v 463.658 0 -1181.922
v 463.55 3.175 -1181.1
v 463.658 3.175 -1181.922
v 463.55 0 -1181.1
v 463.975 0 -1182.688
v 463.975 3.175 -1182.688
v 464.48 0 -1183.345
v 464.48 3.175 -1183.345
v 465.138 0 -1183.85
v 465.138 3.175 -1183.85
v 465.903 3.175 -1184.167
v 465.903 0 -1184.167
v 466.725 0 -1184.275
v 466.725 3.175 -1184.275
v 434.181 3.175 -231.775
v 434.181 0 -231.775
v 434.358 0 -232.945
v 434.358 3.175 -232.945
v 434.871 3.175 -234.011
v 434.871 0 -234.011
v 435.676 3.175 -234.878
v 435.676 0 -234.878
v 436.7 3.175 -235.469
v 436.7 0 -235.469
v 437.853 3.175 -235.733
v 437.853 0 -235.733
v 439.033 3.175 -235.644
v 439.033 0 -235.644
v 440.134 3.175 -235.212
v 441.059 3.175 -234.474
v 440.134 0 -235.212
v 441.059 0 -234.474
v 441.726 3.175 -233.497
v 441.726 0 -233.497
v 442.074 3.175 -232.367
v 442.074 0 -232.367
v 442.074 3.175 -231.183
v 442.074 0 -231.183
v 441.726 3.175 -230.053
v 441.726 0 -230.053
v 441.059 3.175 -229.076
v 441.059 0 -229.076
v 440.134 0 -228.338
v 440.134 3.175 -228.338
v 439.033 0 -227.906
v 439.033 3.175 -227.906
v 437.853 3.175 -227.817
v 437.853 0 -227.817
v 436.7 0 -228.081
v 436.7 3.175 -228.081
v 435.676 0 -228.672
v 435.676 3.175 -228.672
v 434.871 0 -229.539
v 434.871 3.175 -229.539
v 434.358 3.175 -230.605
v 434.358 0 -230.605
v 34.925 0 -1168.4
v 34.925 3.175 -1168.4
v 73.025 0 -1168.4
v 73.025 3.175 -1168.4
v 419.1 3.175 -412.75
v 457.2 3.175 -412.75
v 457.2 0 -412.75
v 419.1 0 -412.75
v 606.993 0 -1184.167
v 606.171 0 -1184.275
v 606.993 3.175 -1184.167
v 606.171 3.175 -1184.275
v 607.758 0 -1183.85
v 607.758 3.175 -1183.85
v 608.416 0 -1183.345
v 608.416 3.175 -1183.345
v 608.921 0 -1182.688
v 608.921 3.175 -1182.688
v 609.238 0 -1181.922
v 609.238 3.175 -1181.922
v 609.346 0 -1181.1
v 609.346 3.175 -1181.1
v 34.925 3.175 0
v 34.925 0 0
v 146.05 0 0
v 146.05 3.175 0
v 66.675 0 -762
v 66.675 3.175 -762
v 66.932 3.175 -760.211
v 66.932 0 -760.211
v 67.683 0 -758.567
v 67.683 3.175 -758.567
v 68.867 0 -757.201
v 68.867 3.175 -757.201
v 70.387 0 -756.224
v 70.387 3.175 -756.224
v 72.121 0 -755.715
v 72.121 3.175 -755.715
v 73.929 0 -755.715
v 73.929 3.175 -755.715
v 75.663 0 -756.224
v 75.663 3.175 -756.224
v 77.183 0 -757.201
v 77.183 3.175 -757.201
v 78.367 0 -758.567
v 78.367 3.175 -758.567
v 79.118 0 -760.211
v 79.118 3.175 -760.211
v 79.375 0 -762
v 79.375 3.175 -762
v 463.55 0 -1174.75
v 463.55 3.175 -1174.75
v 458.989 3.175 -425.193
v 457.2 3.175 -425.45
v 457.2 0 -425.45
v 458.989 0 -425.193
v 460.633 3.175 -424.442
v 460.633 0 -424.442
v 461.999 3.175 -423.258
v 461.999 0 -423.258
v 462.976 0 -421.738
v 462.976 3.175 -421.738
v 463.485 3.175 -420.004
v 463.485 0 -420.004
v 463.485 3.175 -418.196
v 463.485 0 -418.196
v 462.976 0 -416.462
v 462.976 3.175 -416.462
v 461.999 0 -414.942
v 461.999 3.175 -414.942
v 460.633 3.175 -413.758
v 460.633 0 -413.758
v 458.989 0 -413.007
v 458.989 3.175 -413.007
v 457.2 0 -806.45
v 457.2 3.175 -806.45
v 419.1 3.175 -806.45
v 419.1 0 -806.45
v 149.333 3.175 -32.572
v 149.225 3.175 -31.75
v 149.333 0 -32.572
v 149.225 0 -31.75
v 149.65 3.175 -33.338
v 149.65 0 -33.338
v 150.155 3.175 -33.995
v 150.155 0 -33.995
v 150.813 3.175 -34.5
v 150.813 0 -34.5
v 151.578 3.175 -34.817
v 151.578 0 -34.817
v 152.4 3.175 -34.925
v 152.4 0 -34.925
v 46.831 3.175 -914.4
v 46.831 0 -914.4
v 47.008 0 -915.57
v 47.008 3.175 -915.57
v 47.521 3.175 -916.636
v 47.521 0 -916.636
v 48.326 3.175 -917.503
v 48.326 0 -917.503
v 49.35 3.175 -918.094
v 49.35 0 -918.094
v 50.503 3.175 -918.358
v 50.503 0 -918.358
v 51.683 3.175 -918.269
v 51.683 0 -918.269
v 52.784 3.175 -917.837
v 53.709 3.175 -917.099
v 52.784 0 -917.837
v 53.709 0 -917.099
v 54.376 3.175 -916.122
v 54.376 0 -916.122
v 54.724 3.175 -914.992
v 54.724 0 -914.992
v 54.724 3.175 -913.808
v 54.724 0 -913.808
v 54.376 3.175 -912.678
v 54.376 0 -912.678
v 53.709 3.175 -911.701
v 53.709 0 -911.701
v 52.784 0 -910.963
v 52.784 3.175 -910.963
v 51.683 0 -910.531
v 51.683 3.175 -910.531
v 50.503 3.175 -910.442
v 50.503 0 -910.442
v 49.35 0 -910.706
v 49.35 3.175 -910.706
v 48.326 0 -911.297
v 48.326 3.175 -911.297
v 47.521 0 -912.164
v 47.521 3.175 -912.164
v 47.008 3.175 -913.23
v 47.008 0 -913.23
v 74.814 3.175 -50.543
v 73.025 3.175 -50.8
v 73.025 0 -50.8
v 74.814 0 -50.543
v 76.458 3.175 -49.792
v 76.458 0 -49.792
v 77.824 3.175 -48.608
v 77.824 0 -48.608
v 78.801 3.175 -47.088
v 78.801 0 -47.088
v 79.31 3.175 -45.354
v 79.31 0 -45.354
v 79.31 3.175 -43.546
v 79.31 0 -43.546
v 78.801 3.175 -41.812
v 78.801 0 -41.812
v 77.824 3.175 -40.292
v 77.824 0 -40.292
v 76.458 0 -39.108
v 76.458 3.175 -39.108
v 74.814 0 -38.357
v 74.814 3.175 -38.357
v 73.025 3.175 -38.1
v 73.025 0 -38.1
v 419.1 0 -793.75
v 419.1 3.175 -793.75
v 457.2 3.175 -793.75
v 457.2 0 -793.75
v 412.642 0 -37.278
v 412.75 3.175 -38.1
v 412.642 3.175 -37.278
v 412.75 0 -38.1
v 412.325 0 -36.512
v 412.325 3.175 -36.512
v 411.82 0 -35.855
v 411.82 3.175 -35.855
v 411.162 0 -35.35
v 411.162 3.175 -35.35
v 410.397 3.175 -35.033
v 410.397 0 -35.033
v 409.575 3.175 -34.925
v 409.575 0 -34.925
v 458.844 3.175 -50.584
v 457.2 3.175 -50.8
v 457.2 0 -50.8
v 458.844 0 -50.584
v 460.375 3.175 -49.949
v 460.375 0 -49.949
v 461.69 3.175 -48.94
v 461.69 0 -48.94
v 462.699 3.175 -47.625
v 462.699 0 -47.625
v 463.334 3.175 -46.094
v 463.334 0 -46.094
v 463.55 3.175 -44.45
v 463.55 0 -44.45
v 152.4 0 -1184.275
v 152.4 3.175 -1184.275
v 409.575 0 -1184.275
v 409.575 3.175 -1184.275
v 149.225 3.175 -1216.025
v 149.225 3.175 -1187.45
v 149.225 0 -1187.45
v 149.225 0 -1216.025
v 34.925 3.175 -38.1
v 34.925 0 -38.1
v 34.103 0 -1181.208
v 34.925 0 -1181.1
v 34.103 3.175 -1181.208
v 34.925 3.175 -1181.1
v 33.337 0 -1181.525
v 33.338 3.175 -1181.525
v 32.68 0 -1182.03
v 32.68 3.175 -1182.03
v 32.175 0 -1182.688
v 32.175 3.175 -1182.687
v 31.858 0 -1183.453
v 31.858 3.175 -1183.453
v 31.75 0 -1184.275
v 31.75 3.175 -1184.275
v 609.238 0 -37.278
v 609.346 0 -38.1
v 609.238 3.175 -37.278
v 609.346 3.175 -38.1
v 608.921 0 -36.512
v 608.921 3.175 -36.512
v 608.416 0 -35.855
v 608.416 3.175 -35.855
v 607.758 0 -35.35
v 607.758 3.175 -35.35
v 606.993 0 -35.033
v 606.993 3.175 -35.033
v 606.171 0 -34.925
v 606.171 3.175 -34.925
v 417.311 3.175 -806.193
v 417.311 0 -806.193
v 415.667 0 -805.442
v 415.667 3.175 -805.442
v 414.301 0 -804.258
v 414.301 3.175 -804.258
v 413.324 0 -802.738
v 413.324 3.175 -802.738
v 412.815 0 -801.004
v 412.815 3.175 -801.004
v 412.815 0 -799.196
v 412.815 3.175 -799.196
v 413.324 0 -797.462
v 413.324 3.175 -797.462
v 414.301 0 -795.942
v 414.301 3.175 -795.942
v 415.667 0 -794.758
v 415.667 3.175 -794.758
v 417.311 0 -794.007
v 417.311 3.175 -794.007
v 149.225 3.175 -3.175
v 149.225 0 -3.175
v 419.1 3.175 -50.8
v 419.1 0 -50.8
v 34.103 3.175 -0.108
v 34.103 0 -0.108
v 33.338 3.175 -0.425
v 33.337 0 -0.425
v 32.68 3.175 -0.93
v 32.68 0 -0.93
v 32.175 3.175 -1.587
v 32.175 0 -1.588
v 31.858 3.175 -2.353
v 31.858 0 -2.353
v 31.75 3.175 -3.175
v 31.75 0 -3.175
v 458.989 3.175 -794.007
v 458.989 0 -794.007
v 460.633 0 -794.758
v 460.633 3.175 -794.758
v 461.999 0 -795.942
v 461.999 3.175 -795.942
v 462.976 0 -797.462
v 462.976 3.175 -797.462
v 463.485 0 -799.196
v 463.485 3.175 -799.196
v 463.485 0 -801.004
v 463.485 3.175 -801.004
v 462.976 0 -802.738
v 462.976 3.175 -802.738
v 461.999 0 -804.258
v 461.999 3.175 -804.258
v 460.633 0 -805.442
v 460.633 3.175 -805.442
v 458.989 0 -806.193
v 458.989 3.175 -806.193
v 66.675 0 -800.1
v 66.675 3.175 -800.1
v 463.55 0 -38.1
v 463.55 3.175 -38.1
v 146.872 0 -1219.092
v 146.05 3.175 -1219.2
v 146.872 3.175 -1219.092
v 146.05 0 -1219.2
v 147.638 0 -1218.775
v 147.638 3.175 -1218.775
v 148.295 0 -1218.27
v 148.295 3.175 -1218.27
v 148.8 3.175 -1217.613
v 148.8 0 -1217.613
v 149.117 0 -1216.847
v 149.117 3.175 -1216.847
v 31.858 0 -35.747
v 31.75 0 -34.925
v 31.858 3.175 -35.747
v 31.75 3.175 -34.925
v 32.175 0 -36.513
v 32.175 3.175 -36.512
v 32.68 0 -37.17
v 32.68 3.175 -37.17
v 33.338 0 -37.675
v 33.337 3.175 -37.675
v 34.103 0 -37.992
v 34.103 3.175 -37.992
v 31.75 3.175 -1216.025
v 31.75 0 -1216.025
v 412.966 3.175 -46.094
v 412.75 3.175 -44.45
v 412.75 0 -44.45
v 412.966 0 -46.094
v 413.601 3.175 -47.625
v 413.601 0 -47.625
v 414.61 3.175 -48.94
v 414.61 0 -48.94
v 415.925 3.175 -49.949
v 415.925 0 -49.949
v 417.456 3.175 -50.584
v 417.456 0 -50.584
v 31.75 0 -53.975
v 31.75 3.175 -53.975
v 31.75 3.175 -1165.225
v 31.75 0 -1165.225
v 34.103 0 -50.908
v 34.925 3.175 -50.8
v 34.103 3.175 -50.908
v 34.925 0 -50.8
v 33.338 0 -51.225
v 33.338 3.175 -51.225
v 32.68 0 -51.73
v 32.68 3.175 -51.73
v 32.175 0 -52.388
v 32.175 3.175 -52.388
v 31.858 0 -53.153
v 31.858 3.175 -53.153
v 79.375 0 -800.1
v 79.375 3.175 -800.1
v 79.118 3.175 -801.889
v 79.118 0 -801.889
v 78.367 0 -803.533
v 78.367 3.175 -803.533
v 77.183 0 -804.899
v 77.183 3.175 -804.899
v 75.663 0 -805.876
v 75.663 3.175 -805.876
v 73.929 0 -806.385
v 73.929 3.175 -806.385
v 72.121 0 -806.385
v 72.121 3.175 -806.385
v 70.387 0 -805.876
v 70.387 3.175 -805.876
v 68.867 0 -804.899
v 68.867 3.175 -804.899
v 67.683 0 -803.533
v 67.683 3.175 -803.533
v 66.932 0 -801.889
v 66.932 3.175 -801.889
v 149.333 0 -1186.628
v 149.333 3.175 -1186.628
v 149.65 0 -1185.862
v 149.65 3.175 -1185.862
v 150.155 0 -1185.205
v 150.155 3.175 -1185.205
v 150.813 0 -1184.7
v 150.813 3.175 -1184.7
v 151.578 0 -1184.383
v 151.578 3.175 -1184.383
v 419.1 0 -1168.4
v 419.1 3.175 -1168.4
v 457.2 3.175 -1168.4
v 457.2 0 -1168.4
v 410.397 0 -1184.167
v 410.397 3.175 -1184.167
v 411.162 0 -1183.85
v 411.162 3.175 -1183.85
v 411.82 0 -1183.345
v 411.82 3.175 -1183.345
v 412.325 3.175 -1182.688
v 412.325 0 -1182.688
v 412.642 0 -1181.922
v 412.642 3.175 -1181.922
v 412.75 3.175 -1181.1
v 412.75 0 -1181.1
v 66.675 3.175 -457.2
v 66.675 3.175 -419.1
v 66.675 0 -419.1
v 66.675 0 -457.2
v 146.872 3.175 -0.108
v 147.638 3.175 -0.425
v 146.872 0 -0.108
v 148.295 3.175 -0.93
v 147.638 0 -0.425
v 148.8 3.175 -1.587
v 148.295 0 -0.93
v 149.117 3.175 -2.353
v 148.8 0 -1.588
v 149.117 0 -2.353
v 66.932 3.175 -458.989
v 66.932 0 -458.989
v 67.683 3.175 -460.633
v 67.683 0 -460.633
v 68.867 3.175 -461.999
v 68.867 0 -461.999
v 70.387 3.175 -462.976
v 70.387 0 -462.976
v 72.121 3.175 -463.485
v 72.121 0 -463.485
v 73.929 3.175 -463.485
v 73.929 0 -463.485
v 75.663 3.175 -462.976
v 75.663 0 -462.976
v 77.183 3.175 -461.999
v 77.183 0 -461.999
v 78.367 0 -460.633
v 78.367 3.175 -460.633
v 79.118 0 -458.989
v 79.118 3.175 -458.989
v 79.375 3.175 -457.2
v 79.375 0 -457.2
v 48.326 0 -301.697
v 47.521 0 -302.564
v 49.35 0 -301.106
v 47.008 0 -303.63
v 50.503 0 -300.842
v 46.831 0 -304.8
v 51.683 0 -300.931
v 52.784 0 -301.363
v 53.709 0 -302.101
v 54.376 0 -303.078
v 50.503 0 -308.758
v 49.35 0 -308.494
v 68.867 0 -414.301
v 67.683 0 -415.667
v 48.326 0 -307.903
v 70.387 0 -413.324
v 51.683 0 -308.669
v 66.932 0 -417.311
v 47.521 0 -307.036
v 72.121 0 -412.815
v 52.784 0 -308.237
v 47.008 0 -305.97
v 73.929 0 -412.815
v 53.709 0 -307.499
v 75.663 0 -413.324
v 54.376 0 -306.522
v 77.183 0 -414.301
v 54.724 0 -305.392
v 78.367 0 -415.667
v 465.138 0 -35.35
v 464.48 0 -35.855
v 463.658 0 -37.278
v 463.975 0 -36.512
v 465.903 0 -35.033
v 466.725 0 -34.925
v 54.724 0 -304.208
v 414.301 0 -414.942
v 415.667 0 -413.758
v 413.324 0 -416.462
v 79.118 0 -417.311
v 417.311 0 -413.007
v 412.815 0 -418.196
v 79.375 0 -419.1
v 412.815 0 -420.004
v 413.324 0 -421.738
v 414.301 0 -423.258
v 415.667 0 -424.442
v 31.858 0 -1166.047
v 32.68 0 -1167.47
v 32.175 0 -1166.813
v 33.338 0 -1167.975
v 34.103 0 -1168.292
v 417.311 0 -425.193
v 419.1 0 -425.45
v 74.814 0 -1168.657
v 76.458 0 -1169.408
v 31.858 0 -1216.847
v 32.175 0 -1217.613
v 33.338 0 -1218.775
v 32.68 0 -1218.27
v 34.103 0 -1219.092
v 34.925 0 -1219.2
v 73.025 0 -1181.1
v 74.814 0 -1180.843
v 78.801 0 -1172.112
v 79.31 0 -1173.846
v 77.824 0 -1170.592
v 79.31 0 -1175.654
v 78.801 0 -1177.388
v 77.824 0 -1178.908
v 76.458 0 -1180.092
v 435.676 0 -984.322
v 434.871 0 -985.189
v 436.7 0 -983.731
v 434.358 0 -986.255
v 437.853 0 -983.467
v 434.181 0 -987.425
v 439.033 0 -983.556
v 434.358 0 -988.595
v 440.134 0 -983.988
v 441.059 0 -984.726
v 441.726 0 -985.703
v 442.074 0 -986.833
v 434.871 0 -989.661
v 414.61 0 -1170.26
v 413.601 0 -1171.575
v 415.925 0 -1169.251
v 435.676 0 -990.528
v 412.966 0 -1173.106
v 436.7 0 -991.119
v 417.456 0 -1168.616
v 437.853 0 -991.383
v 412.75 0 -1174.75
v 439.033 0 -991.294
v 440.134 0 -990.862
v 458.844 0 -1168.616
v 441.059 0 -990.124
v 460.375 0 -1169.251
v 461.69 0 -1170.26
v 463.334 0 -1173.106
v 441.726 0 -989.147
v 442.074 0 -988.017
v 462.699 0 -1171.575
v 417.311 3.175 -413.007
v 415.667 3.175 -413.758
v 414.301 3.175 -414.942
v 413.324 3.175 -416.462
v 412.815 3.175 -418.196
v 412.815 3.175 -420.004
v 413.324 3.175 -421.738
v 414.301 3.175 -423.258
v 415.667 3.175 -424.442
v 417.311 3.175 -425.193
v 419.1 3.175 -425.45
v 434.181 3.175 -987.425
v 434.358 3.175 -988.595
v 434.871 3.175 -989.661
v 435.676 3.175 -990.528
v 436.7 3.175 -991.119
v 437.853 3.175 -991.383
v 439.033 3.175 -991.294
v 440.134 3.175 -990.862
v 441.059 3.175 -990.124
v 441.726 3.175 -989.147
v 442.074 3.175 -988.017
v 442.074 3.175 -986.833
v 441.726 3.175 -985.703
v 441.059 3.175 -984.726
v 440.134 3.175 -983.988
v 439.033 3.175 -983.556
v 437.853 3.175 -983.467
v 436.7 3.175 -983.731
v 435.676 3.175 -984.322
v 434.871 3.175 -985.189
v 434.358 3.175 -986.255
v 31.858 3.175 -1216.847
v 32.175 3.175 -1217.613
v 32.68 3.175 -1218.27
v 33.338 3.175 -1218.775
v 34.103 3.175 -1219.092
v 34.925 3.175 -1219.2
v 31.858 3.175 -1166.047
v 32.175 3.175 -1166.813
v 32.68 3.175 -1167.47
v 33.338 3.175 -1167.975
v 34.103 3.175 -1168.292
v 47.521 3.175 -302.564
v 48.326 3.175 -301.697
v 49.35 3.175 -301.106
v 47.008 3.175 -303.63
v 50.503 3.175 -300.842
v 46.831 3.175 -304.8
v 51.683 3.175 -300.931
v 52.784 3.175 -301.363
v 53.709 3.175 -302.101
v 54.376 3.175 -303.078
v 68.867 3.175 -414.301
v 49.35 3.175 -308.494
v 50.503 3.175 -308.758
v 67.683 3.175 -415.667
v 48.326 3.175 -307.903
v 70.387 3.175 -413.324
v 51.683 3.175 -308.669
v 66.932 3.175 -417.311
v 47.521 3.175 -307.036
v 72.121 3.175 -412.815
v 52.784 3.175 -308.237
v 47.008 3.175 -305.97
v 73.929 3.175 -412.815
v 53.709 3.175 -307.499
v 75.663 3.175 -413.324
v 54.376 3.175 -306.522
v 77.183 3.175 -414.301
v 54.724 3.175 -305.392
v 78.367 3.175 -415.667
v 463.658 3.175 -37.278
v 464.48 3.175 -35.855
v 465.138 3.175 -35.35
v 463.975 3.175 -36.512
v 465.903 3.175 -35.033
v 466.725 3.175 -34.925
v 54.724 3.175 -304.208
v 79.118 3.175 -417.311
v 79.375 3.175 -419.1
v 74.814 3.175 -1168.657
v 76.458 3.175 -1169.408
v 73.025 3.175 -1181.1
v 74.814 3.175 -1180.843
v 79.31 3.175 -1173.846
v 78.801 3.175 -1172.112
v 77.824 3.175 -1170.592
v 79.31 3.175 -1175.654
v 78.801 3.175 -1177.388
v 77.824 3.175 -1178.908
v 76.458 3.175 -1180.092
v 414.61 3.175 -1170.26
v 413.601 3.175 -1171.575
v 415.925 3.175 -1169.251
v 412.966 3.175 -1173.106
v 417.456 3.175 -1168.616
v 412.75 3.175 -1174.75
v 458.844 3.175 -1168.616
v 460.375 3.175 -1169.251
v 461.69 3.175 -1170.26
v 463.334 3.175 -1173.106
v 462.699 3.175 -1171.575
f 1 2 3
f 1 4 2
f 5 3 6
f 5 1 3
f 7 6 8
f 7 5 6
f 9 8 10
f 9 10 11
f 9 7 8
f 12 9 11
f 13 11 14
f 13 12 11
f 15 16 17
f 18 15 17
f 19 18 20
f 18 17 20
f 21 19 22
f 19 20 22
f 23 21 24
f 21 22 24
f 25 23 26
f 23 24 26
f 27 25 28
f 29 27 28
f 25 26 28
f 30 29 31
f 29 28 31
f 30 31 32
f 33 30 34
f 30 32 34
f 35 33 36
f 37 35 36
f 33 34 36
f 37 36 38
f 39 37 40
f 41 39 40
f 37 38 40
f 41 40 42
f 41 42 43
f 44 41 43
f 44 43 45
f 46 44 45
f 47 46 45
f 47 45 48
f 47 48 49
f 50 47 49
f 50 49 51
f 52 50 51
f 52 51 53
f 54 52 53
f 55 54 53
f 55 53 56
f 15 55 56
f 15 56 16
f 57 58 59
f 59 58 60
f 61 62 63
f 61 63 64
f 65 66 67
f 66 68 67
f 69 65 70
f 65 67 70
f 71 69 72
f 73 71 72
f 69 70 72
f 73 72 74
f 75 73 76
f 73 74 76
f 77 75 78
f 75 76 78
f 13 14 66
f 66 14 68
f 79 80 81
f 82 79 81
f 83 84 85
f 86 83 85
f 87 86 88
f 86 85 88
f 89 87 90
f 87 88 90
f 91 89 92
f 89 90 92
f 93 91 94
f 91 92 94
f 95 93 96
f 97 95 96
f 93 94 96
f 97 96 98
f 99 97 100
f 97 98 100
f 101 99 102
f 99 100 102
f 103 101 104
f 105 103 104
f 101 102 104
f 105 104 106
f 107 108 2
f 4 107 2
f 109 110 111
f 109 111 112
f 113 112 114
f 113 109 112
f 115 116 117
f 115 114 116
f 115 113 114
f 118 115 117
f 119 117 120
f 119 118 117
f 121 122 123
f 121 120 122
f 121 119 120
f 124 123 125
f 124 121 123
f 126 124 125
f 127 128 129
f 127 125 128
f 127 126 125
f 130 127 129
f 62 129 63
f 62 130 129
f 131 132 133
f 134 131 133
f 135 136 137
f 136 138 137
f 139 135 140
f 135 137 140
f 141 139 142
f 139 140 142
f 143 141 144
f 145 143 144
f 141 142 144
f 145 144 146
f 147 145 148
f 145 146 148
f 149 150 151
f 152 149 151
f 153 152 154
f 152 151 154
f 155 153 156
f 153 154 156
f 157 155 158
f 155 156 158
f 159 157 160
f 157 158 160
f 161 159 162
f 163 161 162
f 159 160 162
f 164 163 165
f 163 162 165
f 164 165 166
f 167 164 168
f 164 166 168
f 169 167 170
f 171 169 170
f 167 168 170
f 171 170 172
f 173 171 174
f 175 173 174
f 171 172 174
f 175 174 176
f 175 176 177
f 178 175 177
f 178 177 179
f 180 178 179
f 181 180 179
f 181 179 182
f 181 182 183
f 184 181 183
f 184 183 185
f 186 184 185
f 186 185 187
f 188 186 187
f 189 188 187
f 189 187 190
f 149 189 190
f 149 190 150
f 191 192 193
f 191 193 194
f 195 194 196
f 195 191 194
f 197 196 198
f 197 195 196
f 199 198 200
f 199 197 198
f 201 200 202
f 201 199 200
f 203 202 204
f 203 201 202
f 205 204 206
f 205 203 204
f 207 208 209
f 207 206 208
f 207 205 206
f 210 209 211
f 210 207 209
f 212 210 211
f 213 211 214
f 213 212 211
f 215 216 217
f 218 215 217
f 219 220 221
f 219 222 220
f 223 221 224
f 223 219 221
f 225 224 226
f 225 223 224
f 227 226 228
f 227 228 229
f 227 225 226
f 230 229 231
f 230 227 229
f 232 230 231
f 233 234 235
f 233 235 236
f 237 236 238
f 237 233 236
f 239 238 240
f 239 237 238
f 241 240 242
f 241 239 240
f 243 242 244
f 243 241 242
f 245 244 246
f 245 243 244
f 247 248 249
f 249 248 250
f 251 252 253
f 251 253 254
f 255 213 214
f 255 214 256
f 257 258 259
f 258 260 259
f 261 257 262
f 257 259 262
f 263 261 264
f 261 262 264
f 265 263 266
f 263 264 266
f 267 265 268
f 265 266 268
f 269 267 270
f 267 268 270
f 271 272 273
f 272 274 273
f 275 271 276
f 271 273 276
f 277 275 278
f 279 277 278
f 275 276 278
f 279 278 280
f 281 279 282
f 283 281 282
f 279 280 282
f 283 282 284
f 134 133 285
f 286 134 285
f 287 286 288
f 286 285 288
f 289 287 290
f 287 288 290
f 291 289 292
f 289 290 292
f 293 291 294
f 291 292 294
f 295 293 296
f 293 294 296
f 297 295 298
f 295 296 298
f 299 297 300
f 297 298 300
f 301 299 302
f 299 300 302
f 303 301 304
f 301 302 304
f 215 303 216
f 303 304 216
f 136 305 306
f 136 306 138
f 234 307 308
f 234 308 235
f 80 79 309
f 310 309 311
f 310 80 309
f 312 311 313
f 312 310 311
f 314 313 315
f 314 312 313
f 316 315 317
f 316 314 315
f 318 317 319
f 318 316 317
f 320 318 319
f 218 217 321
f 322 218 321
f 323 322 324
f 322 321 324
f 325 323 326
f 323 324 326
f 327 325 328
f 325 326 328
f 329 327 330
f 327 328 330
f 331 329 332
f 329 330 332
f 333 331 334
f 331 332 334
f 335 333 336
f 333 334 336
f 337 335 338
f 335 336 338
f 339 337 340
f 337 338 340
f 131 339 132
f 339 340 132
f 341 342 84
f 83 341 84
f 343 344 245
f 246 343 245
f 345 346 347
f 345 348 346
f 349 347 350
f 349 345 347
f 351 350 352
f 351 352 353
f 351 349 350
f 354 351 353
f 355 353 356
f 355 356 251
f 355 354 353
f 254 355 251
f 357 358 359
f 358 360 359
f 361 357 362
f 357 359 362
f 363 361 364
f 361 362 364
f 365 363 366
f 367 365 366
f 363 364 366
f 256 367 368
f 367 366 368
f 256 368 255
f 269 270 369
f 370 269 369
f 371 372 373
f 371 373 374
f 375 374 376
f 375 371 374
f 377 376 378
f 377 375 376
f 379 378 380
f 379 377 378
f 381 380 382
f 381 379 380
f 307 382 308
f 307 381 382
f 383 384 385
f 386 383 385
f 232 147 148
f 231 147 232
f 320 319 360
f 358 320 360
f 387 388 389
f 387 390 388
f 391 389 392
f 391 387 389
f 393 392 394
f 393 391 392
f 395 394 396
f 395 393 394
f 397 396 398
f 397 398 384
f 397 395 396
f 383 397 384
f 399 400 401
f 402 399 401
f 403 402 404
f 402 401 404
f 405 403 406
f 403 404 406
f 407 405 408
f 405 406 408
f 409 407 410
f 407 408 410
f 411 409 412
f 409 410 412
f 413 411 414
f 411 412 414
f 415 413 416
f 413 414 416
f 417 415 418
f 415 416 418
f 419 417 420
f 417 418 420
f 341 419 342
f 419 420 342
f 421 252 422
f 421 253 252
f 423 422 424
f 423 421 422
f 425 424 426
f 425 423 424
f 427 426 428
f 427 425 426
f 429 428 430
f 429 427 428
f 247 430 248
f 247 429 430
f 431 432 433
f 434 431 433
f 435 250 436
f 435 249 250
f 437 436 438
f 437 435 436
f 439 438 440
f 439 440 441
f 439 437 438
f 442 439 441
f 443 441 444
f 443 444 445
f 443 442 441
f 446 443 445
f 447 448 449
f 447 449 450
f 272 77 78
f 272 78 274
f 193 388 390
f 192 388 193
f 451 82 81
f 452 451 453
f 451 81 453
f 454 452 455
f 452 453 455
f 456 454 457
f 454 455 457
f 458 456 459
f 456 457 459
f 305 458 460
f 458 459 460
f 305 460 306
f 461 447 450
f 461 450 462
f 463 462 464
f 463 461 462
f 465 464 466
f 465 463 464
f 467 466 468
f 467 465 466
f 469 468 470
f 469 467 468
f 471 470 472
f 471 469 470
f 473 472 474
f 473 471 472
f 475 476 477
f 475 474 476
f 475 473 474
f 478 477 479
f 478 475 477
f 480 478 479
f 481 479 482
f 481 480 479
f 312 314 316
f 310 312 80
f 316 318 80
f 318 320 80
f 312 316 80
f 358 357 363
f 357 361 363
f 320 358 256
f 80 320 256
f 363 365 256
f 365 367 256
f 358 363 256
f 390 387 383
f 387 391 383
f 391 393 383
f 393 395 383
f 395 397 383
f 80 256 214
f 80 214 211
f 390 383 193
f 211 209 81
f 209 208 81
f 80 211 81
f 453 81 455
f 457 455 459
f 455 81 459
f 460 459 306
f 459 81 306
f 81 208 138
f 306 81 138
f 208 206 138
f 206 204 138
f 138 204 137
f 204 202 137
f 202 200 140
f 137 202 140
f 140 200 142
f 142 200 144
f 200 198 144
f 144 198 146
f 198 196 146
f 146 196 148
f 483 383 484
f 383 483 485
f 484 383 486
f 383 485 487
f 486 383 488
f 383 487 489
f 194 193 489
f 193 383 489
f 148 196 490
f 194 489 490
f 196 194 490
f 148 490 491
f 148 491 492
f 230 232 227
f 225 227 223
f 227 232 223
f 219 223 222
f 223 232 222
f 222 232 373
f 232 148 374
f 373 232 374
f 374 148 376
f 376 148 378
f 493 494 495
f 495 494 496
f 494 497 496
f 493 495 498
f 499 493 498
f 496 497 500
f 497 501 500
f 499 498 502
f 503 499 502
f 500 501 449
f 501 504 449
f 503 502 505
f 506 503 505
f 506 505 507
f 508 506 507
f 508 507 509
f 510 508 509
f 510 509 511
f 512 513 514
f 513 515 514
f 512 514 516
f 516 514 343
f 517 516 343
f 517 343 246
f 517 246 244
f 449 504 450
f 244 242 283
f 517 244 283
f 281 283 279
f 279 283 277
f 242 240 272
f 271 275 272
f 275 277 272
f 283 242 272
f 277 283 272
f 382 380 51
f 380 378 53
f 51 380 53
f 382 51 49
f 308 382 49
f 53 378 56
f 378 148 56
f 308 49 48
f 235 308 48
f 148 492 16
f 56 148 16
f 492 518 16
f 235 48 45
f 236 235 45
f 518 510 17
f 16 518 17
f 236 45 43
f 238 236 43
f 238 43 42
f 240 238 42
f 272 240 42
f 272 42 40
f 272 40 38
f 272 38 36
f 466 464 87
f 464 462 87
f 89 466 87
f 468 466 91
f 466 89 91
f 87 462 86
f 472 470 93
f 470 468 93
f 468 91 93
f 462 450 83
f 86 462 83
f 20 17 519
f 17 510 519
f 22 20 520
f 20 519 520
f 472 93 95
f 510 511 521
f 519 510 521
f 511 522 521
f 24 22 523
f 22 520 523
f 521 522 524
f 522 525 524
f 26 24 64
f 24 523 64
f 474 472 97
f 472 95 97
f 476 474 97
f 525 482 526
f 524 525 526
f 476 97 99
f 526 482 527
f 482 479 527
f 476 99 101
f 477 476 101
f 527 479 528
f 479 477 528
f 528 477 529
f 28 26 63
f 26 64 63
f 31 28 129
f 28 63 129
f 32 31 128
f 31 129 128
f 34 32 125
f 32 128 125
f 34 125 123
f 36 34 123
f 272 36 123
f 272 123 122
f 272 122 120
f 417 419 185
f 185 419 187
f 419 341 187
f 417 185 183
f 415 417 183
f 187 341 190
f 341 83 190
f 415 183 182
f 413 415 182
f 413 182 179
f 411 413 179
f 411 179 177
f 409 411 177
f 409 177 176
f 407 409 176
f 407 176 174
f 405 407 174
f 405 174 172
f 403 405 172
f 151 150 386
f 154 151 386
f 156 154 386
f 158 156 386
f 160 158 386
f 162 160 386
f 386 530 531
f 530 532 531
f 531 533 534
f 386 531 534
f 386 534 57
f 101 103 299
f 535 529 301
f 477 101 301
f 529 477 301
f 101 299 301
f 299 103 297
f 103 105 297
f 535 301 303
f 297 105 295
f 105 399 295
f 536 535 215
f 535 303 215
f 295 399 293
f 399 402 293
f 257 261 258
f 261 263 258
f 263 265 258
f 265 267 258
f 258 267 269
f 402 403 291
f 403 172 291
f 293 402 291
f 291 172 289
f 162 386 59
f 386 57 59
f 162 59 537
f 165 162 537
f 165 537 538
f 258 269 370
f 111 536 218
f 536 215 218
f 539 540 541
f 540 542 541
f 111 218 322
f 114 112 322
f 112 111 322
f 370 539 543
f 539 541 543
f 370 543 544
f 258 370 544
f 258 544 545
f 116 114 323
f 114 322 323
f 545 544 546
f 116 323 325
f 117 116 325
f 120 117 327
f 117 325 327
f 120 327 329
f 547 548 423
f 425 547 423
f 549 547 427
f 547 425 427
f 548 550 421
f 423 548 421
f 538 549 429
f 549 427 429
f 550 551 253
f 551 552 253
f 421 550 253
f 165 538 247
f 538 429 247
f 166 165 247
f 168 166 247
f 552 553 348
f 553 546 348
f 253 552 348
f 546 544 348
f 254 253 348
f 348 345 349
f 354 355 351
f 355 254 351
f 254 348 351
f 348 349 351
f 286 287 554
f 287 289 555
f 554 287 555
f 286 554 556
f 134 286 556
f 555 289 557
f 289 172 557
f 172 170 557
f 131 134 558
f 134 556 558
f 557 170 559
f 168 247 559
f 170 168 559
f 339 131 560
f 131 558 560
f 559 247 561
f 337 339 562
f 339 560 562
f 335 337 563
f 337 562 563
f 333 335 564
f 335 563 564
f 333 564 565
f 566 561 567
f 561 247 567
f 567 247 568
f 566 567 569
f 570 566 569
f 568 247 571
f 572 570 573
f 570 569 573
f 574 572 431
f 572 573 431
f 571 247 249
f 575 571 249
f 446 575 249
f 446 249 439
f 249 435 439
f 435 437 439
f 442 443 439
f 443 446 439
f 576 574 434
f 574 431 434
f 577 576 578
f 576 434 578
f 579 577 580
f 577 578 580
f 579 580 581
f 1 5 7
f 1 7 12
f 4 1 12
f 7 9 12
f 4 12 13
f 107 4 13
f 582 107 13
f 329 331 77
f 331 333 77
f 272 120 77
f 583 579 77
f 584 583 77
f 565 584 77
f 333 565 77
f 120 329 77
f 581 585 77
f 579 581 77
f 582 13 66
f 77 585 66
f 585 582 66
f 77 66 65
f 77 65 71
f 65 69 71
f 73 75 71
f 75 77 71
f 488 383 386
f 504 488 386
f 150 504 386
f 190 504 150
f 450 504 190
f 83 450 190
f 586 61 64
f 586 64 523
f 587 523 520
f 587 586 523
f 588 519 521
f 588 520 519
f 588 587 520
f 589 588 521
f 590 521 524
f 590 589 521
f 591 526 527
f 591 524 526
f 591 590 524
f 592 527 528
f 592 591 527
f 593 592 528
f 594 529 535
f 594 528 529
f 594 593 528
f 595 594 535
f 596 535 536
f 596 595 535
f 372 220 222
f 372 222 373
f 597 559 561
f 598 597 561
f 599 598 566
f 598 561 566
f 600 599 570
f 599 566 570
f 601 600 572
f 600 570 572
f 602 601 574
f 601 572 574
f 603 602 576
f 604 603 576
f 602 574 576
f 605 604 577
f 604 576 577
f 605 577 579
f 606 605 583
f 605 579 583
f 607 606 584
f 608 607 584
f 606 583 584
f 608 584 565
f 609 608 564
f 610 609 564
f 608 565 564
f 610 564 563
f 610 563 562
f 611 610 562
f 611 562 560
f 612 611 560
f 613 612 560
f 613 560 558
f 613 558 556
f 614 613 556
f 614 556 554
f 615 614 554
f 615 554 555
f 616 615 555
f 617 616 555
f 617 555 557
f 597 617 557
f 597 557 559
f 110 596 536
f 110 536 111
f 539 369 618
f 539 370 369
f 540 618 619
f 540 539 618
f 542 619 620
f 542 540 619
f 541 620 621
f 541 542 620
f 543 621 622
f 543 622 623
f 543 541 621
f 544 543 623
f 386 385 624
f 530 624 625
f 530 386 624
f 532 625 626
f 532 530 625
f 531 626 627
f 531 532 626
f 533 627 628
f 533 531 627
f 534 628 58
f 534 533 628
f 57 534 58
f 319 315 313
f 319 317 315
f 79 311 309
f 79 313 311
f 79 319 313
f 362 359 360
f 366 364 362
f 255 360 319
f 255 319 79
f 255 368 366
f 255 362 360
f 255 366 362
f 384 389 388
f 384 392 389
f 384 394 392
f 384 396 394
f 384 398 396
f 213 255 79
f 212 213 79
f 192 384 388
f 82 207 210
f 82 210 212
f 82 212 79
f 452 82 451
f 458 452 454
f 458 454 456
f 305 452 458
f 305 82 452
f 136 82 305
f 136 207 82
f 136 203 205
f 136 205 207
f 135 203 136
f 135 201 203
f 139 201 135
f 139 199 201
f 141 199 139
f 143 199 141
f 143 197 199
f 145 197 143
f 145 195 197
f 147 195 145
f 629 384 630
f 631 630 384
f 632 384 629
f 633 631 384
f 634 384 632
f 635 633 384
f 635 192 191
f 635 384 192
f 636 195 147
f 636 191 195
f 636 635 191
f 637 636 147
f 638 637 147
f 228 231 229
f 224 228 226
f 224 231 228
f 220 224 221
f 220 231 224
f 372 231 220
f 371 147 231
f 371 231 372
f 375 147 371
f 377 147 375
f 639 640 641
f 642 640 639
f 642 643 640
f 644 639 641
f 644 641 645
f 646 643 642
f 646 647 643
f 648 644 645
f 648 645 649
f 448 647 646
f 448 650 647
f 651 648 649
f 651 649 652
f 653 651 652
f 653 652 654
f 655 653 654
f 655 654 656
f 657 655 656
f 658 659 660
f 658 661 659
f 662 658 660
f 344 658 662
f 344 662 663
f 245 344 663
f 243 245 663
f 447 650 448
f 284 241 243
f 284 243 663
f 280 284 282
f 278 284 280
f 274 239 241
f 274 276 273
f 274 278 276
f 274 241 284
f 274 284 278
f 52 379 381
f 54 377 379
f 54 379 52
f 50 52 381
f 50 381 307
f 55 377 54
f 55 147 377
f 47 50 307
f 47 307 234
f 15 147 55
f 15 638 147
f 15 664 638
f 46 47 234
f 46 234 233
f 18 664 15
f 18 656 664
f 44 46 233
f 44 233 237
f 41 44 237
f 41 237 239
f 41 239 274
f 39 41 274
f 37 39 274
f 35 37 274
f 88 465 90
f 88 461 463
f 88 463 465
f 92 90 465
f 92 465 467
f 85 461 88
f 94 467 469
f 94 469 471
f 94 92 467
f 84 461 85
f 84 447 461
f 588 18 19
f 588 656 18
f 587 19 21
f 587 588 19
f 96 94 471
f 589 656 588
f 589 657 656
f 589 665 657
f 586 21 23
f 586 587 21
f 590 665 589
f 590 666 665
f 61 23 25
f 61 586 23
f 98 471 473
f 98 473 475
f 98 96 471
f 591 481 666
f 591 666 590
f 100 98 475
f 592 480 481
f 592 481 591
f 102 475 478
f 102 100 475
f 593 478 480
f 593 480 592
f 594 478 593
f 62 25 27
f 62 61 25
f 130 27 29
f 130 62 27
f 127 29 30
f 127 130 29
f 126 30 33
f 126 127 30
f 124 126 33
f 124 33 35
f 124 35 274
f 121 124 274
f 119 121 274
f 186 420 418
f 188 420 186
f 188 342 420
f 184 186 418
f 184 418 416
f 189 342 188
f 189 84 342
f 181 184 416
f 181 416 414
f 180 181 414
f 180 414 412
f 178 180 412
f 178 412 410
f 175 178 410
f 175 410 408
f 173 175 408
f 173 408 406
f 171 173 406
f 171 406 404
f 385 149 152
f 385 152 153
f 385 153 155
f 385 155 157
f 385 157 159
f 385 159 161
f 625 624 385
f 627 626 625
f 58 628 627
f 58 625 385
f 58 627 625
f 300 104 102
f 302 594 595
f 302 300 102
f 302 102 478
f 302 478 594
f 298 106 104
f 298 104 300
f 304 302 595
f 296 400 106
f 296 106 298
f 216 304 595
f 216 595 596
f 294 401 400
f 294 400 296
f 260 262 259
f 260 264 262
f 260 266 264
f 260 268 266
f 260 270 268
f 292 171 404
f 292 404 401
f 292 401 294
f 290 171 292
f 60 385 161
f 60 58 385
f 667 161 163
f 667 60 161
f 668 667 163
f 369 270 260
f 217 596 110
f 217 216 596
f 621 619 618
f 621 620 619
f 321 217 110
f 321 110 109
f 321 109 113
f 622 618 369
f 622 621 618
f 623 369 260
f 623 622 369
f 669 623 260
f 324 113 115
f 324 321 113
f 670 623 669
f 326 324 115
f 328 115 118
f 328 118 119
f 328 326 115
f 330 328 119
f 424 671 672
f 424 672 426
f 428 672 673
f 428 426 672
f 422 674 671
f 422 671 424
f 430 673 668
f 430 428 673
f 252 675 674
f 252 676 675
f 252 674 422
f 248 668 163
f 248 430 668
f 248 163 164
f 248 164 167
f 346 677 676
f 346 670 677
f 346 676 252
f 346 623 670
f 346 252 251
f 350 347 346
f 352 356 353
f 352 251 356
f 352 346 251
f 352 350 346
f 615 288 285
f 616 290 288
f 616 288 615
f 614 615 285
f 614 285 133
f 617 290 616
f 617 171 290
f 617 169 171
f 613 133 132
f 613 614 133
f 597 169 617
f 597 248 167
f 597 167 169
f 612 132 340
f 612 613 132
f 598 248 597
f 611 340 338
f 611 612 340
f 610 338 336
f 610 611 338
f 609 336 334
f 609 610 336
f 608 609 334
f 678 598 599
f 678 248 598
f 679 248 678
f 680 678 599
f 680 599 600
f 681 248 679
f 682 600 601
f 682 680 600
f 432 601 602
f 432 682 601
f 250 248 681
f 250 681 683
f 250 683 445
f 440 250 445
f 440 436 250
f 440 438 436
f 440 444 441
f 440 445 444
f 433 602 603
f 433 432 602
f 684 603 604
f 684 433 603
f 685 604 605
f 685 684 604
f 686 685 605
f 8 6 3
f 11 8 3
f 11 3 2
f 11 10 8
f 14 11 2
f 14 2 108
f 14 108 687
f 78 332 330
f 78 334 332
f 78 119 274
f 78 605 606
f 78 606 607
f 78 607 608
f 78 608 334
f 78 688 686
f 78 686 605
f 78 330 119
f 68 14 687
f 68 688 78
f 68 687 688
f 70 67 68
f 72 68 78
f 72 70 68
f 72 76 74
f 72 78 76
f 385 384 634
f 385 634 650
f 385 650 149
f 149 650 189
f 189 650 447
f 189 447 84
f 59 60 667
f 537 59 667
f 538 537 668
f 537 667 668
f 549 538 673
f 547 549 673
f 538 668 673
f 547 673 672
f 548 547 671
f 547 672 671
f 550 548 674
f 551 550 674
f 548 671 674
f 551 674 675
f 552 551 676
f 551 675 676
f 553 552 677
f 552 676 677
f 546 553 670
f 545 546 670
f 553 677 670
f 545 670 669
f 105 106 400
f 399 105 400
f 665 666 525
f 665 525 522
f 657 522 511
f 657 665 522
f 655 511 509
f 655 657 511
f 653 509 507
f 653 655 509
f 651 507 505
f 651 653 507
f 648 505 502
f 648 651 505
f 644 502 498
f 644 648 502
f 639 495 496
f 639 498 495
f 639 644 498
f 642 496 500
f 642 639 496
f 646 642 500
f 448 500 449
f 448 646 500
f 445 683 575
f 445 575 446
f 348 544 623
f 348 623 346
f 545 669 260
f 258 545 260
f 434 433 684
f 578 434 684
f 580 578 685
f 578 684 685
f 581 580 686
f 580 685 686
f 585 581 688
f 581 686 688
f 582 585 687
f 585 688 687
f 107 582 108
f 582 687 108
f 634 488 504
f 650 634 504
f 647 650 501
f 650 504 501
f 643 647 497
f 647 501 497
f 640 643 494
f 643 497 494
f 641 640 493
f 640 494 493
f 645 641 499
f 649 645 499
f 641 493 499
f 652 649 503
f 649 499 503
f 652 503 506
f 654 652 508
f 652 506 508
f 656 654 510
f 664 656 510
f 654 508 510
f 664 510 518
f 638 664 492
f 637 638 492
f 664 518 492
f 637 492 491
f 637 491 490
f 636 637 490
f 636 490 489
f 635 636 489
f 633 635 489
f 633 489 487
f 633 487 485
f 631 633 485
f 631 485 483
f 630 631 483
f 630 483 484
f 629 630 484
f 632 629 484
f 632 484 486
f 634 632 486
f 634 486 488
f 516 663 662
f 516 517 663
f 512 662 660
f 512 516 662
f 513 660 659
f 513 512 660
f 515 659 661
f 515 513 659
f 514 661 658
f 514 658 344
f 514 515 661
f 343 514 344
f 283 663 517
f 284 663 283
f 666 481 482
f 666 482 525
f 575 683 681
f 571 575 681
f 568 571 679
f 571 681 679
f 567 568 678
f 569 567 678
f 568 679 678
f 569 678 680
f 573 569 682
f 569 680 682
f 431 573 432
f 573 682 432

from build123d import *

# Parameters (mm, degrees)
SKETCH1_W                      = 609.6
SKETCH1_H                      = 1219.2
BOSS_EXTRUDE1_DEPTH            = 3.175
F_5_16_0_3125_DIAMETER_HOLE1_D = 7.9375
SKETCH5_W                      = 920.75
SKETCH5_H                      = 34.925
CUT_EXTRUDE2_DEPTH             = 1364.110736743
CUT_EXTRUDE1_DEPTH             = 1364.110736743
SKETCH6_W                      = 0.254
SKETCH6_H                      = 1149.35
CUT_EXTRUDE3_DEPTH             = 1364.110736743
CUT_EXTRUDE4_DEPTH             = 1363.997163732
SKETCH14_W                     = 50.8
SKETCH14_H                     = 9.525
CUT_EXTRUDE5_DEPTH             = 1363.997163732
FILLET1_R                      = 3.175


with BuildPart() as part:
    # Sketch1 → Boss-Extrude1 (new body)
    with BuildSketch(Plane(origin=(0, 0, 0), x_dir=(1, 0, 0), z_dir=(0, 1, 0))):
        with Locations((304.8, 609.6)):
            Rectangle(SKETCH1_W, SKETCH1_H)
    extrude(amount=BOSS_EXTRUDE1_DEPTH)

    # 5/16 (0.3125) Diameter Hole1 (through all)
    with Locations(Plane(origin=(0, 3.175, 0), x_dir=(1, 0, 0), z_dir=(0, 1, 0))):
        with Locations((50.8, 914.4), (50.8, 304.8), (438.15, 987.425), (438.15, 231.775)):
            Hole(F_5_16_0_3125_DIAMETER_HOLE1_D / 2)

    # Sketch5 → Cut-Extrude2 (cut, through all)
    with BuildSketch(Plane(origin=(0, 3.175, 0), x_dir=(1, 0, 0), z_dir=(0, 1, 0))):
        with Locations((609.6, 1201.7375)):
            Rectangle(SKETCH5_W, SKETCH5_H)
        with Locations((609.6, 17.4625)):
            Rectangle(SKETCH5_W, SKETCH5_H)
    extrude(amount=-CUT_EXTRUDE2_DEPTH, mode=Mode.SUBTRACT)

    # Sketch2 → Cut-Extrude1 (cut, through all)
    with BuildSketch(Plane(origin=(0, 3.175, 0), x_dir=(1, 0, 0), z_dir=(0, 1, 0))):
        Polygon((0, 0), (0, 1219.2), (31.75, 1219.2), (31.75, 812.8), (31.75, 406.4), (31.75, 0), align=None)
    extrude(amount=-CUT_EXTRUDE1_DEPTH, mode=Mode.SUBTRACT)

    # Sketch6 → Cut-Extrude3 (cut, through all)
    with BuildSketch(Plane.XZ):
        with Locations((609.473, -609.6)):
            Rectangle(SKETCH6_W, SKETCH6_H)
    extrude(amount=-CUT_EXTRUDE3_DEPTH, mode=Mode.SUBTRACT)

    # Sketch13 → Cut-Extrude4 (cut, through all)
    with BuildSketch(Plane(origin=(0, 3.175, 0), x_dir=(1, 0, 0), z_dir=(0, 1, 0))):
        with BuildLine():
            Line((66.675, 419.1), (66.675, 457.2))
            ThreePointArc((66.675, 457.2), (73.025, 463.55), (79.375, 457.2))
            Line((79.375, 457.2), (79.375, 419.1))
            ThreePointArc((79.375, 419.1), (73.025, 412.75), (66.675, 419.1))
        make_face()
        with BuildLine():
            Line((419.1, 425.45), (457.2, 425.45))
            ThreePointArc((457.2, 425.45), (463.55, 419.1), (457.2, 412.75))
            Line((457.2, 412.75), (419.1, 412.75))
            ThreePointArc((419.1, 412.75), (412.75, 419.1), (419.1, 425.45))
        make_face()
        with BuildLine():
            Line((28.575, 50.8), (73.025, 50.8))
            ThreePointArc((73.025, 50.8), (79.375, 44.45), (73.025, 38.1))
            Line((73.025, 38.1), (28.575, 38.1))
            ThreePointArc((28.575, 38.1), (22.225, 44.45), (28.575, 50.8))
        make_face()
        with BuildLine():
            Line((419.1, 50.8), (457.2, 50.8))
            ThreePointArc((457.2, 50.8), (463.55, 44.45), (457.2, 38.1))
            Line((457.2, 38.1), (419.1, 38.1))
            ThreePointArc((419.1, 38.1), (412.75, 44.45), (419.1, 50.8))
        make_face()
        with BuildLine():
            Line((66.675, 800.1), (66.675, 762))
            ThreePointArc((66.675, 762), (73.025, 755.65), (79.375, 762))
            Line((79.375, 762), (79.375, 800.1))
            ThreePointArc((79.375, 800.1), (73.025, 806.45), (66.675, 800.1))
        make_face()
        with BuildLine():
            Line((419.1, 793.75), (457.2, 793.75))
            ThreePointArc((457.2, 793.75), (463.55, 800.1), (457.2, 806.45))
            Line((457.2, 806.45), (419.1, 806.45))
            ThreePointArc((419.1, 806.45), (412.75, 800.1), (419.1, 793.75))
        make_face()
        with BuildLine():
            Line((28.575, 1168.4), (73.025, 1168.4))
            ThreePointArc((73.025, 1168.4), (79.375, 1174.75), (73.025, 1181.1))
            Line((73.025, 1181.1), (28.575, 1181.1))
            ThreePointArc((28.575, 1181.1), (22.225, 1174.75), (28.575, 1168.4))
        make_face()
        with BuildLine():
            Line((419.1, 1168.4), (457.2, 1168.4))
            ThreePointArc((457.2, 1168.4), (463.55, 1174.75), (457.2, 1181.1))
            Line((457.2, 1181.1), (419.1, 1181.1))
            ThreePointArc((419.1, 1181.1), (412.75, 1174.75), (419.1, 1168.4))
        make_face()
    extrude(amount=-CUT_EXTRUDE4_DEPTH, mode=Mode.SUBTRACT)

    # Sketch14 → Cut-Extrude5 (cut, through all)
    with BuildSketch(Plane(origin=(0, 3.175, 0), x_dir=(1, 0, 0), z_dir=(0, 1, 0))):
        with Locations((438.15, 39.6875)):
            Rectangle(SKETCH14_W, SKETCH14_H)
        with Locations((438.15, 1179.5125)):
            Rectangle(SKETCH14_W, SKETCH14_H)
    extrude(amount=-CUT_EXTRUDE5_DEPTH, mode=Mode.SUBTRACT)

    # Fillet1
    fillet1_edges = [part.edges().sort_by_distance(p)[0] for p in [
        (609.346, 1.5875, -1184.275),
        (609.346, 1.5875, -34.925),
        (31.75, 1.5875, -1168.4),
        (31.75, 1.5875, -1181.1),
        (31.75, 1.5875, -38.1),
        (31.75, 1.5875, -50.8),
        (463.55, 1.5875, -34.925),
        (412.75, 1.5875, -34.925),
        (463.55, 1.5875, -1184.275),
        (412.75, 1.5875, -1184.275),
        (149.225, 1.5875, -1219.2),
        (149.225, 1.5875, -1184.275),
        (149.225, 1.5875, -34.925),
        (149.225, 1.5875, 0),
        (31.75, 1.5875, -1219.2),
        (31.75, 1.5875, 0),
    ]]
    fillet(fillet1_edges, radius=FILLET1_R)


solid = part.part
